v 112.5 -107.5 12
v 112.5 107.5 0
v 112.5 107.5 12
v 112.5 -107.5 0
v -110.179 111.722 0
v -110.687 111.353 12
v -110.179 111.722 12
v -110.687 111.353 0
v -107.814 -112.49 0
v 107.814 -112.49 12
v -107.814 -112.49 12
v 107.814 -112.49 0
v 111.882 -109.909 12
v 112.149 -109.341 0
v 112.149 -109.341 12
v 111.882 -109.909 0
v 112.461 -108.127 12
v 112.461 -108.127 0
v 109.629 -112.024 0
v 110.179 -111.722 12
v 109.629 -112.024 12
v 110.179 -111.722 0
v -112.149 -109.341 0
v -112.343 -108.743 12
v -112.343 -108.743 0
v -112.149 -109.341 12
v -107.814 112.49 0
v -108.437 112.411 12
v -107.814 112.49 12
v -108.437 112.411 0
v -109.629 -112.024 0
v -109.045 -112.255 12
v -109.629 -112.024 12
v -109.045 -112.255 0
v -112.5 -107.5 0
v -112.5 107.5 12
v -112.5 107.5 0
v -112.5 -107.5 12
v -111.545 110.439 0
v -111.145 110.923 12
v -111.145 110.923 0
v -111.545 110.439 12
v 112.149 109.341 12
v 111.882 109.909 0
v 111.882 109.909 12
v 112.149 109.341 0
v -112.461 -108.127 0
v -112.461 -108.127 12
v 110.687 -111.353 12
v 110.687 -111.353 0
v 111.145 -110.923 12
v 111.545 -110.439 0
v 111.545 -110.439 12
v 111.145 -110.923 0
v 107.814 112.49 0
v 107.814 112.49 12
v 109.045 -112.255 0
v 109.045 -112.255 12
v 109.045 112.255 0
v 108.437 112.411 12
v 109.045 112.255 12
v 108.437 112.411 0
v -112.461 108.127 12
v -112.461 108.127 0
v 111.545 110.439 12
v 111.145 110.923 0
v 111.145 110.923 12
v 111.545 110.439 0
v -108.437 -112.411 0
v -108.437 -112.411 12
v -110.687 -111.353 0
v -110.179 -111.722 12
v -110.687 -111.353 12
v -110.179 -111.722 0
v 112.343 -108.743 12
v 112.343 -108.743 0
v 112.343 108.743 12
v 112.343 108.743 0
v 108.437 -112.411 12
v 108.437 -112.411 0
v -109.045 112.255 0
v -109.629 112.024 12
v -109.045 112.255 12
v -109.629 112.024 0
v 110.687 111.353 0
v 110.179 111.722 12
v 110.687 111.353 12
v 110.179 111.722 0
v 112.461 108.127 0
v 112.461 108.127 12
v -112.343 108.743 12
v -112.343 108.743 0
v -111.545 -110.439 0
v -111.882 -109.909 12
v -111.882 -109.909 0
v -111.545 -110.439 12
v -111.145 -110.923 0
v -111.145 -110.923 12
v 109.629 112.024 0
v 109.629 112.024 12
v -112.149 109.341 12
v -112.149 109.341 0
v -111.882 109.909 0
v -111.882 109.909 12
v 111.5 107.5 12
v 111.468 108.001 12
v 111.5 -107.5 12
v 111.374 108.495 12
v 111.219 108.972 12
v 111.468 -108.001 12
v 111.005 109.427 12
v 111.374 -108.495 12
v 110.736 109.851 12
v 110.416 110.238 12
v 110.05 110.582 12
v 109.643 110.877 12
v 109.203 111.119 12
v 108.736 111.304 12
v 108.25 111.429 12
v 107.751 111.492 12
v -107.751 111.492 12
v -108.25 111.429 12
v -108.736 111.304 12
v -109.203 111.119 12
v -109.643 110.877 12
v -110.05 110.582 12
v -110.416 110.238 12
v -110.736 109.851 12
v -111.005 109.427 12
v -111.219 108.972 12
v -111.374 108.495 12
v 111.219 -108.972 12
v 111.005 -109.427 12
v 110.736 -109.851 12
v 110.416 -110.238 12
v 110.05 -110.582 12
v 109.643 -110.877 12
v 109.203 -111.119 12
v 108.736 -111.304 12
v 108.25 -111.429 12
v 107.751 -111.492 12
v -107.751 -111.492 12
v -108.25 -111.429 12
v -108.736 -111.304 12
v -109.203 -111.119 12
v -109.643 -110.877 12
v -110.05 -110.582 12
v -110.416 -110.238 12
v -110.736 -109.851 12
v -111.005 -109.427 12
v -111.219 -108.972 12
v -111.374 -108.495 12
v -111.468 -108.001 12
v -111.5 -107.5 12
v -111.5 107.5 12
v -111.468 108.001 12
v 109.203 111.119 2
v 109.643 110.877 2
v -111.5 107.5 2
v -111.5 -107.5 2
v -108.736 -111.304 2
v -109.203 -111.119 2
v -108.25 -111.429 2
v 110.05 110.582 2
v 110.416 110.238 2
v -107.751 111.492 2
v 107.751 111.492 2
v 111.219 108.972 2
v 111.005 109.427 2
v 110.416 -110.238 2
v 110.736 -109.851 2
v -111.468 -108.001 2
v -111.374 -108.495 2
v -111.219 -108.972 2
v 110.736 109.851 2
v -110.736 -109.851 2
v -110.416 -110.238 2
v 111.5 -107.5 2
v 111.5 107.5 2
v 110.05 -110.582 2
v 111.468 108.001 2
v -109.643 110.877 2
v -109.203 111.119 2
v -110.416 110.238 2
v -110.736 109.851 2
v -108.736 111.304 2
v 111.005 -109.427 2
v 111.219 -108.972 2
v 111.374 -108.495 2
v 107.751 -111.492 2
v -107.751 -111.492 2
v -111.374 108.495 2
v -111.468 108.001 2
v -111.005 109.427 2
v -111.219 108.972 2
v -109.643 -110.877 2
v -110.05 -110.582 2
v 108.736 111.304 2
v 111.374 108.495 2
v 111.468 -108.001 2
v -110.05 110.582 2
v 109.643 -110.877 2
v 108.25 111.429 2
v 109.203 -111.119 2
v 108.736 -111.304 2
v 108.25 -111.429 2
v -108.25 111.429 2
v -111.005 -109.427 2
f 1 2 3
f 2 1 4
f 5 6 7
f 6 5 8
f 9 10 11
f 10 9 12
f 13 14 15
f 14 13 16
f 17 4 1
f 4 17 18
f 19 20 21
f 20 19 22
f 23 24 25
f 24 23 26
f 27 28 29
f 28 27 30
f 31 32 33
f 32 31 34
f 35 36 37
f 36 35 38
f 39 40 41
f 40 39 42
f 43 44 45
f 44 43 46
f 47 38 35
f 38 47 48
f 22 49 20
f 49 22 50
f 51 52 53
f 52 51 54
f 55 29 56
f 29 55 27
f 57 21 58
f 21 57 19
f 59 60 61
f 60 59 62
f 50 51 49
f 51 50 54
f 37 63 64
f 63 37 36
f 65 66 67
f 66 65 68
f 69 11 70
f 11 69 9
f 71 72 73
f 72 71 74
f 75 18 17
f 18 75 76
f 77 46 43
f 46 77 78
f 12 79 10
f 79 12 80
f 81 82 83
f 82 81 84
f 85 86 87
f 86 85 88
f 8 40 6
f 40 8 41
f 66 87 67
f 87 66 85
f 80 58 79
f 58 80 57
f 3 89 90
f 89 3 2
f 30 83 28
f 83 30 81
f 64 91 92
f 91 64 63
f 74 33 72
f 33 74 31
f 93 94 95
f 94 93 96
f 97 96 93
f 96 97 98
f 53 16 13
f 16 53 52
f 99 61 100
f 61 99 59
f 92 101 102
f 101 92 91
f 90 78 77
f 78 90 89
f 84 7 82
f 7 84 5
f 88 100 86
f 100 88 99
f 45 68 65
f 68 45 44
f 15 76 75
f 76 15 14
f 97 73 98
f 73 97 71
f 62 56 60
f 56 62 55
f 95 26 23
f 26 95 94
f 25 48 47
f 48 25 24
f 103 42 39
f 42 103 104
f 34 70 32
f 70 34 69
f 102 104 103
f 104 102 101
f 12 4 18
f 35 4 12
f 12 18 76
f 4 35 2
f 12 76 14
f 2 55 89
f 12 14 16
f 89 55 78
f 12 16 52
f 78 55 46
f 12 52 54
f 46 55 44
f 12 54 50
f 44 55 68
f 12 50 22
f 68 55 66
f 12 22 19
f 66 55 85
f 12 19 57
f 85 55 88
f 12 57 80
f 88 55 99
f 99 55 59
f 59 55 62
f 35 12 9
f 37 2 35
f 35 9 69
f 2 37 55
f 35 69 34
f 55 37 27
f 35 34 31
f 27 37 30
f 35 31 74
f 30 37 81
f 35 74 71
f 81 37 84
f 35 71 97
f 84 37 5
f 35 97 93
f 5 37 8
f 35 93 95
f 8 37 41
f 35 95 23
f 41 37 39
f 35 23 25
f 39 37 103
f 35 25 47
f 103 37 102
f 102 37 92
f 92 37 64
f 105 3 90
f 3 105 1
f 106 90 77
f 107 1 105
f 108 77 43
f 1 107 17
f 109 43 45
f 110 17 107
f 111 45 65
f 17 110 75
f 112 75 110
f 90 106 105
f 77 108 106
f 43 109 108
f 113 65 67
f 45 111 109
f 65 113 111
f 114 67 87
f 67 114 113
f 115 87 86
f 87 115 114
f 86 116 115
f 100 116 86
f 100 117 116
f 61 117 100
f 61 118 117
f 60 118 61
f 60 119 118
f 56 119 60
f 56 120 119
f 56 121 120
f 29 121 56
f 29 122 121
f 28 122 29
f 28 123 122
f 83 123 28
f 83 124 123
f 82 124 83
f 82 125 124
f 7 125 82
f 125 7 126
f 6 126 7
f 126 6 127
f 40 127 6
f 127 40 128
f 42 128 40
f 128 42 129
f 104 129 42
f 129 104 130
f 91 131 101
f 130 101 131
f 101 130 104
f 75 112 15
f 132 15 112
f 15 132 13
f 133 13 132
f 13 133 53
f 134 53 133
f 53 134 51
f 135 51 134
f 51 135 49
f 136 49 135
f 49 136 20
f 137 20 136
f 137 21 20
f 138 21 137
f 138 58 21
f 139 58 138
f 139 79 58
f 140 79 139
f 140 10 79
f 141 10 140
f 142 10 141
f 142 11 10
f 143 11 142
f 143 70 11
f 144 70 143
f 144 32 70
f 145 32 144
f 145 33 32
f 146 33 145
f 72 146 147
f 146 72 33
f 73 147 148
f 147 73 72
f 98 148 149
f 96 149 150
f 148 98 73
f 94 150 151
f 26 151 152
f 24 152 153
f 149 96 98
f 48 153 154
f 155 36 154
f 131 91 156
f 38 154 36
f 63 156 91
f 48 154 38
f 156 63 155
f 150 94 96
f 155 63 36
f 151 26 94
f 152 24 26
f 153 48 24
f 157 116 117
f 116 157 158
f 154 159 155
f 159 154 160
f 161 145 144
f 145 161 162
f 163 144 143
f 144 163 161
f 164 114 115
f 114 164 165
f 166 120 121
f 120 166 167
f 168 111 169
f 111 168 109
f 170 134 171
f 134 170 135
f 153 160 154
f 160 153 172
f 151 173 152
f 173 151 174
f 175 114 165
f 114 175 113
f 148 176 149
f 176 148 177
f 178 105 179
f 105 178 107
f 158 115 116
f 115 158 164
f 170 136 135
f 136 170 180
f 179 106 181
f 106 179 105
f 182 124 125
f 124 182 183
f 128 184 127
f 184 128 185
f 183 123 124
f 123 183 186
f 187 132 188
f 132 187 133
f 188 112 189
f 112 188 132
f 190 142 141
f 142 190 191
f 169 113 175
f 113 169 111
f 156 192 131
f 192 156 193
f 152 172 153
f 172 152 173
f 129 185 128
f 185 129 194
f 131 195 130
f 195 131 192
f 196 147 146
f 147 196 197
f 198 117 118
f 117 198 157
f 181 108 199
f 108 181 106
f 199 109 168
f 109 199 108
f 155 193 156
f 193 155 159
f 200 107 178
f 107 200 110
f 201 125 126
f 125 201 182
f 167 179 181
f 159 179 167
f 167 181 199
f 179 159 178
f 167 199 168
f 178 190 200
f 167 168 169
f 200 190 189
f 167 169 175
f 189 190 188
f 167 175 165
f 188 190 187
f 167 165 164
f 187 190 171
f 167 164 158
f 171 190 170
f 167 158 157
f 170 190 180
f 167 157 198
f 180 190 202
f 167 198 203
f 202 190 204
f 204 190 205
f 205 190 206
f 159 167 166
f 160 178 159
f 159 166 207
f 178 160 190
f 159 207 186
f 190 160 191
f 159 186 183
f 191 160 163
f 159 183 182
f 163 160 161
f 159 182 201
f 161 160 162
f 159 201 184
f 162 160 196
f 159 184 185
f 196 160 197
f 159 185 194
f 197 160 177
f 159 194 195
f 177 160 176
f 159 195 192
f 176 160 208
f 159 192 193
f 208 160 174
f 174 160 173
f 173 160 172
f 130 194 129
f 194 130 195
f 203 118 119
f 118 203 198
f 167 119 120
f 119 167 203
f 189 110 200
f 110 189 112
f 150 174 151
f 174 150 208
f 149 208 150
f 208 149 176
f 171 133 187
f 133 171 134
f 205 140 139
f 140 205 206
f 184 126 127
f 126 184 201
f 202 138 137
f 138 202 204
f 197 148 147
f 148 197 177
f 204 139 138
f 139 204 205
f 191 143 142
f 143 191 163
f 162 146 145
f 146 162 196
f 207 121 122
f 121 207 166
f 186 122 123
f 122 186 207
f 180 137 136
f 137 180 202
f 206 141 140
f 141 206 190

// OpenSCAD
$fn = 50;


difference() {
	union() {
		hull() {
			translate(v = [-107.5000000000, 107.5000000000, 0]) {
				cylinder(h = 12, r = 5);
			}
			translate(v = [107.5000000000, 107.5000000000, 0]) {
				cylinder(h = 12, r = 5);
			}
			translate(v = [-107.5000000000, -107.5000000000, 0]) {
				cylinder(h = 12, r = 5);
			}
			translate(v = [107.5000000000, -107.5000000000, 0]) {
				cylinder(h = 12, r = 5);
			}
		}
	}
	union() {
		translate(v = [0, 0, 2]) {
			hull() {
				translate(v = [-107.5000000000, 107.5000000000, 0]) {
					cylinder(h = 10, r = 4);
				}
				translate(v = [107.5000000000, 107.5000000000, 0]) {
					cylinder(h = 10, r = 4);
				}
				translate(v = [-107.5000000000, -107.5000000000, 0]) {
					cylinder(h = 10, r = 4);
				}
				translate(v = [107.5000000000, -107.5000000000, 0]) {
					cylinder(h = 10, r = 4);
				}
			}
		}
	}
}
